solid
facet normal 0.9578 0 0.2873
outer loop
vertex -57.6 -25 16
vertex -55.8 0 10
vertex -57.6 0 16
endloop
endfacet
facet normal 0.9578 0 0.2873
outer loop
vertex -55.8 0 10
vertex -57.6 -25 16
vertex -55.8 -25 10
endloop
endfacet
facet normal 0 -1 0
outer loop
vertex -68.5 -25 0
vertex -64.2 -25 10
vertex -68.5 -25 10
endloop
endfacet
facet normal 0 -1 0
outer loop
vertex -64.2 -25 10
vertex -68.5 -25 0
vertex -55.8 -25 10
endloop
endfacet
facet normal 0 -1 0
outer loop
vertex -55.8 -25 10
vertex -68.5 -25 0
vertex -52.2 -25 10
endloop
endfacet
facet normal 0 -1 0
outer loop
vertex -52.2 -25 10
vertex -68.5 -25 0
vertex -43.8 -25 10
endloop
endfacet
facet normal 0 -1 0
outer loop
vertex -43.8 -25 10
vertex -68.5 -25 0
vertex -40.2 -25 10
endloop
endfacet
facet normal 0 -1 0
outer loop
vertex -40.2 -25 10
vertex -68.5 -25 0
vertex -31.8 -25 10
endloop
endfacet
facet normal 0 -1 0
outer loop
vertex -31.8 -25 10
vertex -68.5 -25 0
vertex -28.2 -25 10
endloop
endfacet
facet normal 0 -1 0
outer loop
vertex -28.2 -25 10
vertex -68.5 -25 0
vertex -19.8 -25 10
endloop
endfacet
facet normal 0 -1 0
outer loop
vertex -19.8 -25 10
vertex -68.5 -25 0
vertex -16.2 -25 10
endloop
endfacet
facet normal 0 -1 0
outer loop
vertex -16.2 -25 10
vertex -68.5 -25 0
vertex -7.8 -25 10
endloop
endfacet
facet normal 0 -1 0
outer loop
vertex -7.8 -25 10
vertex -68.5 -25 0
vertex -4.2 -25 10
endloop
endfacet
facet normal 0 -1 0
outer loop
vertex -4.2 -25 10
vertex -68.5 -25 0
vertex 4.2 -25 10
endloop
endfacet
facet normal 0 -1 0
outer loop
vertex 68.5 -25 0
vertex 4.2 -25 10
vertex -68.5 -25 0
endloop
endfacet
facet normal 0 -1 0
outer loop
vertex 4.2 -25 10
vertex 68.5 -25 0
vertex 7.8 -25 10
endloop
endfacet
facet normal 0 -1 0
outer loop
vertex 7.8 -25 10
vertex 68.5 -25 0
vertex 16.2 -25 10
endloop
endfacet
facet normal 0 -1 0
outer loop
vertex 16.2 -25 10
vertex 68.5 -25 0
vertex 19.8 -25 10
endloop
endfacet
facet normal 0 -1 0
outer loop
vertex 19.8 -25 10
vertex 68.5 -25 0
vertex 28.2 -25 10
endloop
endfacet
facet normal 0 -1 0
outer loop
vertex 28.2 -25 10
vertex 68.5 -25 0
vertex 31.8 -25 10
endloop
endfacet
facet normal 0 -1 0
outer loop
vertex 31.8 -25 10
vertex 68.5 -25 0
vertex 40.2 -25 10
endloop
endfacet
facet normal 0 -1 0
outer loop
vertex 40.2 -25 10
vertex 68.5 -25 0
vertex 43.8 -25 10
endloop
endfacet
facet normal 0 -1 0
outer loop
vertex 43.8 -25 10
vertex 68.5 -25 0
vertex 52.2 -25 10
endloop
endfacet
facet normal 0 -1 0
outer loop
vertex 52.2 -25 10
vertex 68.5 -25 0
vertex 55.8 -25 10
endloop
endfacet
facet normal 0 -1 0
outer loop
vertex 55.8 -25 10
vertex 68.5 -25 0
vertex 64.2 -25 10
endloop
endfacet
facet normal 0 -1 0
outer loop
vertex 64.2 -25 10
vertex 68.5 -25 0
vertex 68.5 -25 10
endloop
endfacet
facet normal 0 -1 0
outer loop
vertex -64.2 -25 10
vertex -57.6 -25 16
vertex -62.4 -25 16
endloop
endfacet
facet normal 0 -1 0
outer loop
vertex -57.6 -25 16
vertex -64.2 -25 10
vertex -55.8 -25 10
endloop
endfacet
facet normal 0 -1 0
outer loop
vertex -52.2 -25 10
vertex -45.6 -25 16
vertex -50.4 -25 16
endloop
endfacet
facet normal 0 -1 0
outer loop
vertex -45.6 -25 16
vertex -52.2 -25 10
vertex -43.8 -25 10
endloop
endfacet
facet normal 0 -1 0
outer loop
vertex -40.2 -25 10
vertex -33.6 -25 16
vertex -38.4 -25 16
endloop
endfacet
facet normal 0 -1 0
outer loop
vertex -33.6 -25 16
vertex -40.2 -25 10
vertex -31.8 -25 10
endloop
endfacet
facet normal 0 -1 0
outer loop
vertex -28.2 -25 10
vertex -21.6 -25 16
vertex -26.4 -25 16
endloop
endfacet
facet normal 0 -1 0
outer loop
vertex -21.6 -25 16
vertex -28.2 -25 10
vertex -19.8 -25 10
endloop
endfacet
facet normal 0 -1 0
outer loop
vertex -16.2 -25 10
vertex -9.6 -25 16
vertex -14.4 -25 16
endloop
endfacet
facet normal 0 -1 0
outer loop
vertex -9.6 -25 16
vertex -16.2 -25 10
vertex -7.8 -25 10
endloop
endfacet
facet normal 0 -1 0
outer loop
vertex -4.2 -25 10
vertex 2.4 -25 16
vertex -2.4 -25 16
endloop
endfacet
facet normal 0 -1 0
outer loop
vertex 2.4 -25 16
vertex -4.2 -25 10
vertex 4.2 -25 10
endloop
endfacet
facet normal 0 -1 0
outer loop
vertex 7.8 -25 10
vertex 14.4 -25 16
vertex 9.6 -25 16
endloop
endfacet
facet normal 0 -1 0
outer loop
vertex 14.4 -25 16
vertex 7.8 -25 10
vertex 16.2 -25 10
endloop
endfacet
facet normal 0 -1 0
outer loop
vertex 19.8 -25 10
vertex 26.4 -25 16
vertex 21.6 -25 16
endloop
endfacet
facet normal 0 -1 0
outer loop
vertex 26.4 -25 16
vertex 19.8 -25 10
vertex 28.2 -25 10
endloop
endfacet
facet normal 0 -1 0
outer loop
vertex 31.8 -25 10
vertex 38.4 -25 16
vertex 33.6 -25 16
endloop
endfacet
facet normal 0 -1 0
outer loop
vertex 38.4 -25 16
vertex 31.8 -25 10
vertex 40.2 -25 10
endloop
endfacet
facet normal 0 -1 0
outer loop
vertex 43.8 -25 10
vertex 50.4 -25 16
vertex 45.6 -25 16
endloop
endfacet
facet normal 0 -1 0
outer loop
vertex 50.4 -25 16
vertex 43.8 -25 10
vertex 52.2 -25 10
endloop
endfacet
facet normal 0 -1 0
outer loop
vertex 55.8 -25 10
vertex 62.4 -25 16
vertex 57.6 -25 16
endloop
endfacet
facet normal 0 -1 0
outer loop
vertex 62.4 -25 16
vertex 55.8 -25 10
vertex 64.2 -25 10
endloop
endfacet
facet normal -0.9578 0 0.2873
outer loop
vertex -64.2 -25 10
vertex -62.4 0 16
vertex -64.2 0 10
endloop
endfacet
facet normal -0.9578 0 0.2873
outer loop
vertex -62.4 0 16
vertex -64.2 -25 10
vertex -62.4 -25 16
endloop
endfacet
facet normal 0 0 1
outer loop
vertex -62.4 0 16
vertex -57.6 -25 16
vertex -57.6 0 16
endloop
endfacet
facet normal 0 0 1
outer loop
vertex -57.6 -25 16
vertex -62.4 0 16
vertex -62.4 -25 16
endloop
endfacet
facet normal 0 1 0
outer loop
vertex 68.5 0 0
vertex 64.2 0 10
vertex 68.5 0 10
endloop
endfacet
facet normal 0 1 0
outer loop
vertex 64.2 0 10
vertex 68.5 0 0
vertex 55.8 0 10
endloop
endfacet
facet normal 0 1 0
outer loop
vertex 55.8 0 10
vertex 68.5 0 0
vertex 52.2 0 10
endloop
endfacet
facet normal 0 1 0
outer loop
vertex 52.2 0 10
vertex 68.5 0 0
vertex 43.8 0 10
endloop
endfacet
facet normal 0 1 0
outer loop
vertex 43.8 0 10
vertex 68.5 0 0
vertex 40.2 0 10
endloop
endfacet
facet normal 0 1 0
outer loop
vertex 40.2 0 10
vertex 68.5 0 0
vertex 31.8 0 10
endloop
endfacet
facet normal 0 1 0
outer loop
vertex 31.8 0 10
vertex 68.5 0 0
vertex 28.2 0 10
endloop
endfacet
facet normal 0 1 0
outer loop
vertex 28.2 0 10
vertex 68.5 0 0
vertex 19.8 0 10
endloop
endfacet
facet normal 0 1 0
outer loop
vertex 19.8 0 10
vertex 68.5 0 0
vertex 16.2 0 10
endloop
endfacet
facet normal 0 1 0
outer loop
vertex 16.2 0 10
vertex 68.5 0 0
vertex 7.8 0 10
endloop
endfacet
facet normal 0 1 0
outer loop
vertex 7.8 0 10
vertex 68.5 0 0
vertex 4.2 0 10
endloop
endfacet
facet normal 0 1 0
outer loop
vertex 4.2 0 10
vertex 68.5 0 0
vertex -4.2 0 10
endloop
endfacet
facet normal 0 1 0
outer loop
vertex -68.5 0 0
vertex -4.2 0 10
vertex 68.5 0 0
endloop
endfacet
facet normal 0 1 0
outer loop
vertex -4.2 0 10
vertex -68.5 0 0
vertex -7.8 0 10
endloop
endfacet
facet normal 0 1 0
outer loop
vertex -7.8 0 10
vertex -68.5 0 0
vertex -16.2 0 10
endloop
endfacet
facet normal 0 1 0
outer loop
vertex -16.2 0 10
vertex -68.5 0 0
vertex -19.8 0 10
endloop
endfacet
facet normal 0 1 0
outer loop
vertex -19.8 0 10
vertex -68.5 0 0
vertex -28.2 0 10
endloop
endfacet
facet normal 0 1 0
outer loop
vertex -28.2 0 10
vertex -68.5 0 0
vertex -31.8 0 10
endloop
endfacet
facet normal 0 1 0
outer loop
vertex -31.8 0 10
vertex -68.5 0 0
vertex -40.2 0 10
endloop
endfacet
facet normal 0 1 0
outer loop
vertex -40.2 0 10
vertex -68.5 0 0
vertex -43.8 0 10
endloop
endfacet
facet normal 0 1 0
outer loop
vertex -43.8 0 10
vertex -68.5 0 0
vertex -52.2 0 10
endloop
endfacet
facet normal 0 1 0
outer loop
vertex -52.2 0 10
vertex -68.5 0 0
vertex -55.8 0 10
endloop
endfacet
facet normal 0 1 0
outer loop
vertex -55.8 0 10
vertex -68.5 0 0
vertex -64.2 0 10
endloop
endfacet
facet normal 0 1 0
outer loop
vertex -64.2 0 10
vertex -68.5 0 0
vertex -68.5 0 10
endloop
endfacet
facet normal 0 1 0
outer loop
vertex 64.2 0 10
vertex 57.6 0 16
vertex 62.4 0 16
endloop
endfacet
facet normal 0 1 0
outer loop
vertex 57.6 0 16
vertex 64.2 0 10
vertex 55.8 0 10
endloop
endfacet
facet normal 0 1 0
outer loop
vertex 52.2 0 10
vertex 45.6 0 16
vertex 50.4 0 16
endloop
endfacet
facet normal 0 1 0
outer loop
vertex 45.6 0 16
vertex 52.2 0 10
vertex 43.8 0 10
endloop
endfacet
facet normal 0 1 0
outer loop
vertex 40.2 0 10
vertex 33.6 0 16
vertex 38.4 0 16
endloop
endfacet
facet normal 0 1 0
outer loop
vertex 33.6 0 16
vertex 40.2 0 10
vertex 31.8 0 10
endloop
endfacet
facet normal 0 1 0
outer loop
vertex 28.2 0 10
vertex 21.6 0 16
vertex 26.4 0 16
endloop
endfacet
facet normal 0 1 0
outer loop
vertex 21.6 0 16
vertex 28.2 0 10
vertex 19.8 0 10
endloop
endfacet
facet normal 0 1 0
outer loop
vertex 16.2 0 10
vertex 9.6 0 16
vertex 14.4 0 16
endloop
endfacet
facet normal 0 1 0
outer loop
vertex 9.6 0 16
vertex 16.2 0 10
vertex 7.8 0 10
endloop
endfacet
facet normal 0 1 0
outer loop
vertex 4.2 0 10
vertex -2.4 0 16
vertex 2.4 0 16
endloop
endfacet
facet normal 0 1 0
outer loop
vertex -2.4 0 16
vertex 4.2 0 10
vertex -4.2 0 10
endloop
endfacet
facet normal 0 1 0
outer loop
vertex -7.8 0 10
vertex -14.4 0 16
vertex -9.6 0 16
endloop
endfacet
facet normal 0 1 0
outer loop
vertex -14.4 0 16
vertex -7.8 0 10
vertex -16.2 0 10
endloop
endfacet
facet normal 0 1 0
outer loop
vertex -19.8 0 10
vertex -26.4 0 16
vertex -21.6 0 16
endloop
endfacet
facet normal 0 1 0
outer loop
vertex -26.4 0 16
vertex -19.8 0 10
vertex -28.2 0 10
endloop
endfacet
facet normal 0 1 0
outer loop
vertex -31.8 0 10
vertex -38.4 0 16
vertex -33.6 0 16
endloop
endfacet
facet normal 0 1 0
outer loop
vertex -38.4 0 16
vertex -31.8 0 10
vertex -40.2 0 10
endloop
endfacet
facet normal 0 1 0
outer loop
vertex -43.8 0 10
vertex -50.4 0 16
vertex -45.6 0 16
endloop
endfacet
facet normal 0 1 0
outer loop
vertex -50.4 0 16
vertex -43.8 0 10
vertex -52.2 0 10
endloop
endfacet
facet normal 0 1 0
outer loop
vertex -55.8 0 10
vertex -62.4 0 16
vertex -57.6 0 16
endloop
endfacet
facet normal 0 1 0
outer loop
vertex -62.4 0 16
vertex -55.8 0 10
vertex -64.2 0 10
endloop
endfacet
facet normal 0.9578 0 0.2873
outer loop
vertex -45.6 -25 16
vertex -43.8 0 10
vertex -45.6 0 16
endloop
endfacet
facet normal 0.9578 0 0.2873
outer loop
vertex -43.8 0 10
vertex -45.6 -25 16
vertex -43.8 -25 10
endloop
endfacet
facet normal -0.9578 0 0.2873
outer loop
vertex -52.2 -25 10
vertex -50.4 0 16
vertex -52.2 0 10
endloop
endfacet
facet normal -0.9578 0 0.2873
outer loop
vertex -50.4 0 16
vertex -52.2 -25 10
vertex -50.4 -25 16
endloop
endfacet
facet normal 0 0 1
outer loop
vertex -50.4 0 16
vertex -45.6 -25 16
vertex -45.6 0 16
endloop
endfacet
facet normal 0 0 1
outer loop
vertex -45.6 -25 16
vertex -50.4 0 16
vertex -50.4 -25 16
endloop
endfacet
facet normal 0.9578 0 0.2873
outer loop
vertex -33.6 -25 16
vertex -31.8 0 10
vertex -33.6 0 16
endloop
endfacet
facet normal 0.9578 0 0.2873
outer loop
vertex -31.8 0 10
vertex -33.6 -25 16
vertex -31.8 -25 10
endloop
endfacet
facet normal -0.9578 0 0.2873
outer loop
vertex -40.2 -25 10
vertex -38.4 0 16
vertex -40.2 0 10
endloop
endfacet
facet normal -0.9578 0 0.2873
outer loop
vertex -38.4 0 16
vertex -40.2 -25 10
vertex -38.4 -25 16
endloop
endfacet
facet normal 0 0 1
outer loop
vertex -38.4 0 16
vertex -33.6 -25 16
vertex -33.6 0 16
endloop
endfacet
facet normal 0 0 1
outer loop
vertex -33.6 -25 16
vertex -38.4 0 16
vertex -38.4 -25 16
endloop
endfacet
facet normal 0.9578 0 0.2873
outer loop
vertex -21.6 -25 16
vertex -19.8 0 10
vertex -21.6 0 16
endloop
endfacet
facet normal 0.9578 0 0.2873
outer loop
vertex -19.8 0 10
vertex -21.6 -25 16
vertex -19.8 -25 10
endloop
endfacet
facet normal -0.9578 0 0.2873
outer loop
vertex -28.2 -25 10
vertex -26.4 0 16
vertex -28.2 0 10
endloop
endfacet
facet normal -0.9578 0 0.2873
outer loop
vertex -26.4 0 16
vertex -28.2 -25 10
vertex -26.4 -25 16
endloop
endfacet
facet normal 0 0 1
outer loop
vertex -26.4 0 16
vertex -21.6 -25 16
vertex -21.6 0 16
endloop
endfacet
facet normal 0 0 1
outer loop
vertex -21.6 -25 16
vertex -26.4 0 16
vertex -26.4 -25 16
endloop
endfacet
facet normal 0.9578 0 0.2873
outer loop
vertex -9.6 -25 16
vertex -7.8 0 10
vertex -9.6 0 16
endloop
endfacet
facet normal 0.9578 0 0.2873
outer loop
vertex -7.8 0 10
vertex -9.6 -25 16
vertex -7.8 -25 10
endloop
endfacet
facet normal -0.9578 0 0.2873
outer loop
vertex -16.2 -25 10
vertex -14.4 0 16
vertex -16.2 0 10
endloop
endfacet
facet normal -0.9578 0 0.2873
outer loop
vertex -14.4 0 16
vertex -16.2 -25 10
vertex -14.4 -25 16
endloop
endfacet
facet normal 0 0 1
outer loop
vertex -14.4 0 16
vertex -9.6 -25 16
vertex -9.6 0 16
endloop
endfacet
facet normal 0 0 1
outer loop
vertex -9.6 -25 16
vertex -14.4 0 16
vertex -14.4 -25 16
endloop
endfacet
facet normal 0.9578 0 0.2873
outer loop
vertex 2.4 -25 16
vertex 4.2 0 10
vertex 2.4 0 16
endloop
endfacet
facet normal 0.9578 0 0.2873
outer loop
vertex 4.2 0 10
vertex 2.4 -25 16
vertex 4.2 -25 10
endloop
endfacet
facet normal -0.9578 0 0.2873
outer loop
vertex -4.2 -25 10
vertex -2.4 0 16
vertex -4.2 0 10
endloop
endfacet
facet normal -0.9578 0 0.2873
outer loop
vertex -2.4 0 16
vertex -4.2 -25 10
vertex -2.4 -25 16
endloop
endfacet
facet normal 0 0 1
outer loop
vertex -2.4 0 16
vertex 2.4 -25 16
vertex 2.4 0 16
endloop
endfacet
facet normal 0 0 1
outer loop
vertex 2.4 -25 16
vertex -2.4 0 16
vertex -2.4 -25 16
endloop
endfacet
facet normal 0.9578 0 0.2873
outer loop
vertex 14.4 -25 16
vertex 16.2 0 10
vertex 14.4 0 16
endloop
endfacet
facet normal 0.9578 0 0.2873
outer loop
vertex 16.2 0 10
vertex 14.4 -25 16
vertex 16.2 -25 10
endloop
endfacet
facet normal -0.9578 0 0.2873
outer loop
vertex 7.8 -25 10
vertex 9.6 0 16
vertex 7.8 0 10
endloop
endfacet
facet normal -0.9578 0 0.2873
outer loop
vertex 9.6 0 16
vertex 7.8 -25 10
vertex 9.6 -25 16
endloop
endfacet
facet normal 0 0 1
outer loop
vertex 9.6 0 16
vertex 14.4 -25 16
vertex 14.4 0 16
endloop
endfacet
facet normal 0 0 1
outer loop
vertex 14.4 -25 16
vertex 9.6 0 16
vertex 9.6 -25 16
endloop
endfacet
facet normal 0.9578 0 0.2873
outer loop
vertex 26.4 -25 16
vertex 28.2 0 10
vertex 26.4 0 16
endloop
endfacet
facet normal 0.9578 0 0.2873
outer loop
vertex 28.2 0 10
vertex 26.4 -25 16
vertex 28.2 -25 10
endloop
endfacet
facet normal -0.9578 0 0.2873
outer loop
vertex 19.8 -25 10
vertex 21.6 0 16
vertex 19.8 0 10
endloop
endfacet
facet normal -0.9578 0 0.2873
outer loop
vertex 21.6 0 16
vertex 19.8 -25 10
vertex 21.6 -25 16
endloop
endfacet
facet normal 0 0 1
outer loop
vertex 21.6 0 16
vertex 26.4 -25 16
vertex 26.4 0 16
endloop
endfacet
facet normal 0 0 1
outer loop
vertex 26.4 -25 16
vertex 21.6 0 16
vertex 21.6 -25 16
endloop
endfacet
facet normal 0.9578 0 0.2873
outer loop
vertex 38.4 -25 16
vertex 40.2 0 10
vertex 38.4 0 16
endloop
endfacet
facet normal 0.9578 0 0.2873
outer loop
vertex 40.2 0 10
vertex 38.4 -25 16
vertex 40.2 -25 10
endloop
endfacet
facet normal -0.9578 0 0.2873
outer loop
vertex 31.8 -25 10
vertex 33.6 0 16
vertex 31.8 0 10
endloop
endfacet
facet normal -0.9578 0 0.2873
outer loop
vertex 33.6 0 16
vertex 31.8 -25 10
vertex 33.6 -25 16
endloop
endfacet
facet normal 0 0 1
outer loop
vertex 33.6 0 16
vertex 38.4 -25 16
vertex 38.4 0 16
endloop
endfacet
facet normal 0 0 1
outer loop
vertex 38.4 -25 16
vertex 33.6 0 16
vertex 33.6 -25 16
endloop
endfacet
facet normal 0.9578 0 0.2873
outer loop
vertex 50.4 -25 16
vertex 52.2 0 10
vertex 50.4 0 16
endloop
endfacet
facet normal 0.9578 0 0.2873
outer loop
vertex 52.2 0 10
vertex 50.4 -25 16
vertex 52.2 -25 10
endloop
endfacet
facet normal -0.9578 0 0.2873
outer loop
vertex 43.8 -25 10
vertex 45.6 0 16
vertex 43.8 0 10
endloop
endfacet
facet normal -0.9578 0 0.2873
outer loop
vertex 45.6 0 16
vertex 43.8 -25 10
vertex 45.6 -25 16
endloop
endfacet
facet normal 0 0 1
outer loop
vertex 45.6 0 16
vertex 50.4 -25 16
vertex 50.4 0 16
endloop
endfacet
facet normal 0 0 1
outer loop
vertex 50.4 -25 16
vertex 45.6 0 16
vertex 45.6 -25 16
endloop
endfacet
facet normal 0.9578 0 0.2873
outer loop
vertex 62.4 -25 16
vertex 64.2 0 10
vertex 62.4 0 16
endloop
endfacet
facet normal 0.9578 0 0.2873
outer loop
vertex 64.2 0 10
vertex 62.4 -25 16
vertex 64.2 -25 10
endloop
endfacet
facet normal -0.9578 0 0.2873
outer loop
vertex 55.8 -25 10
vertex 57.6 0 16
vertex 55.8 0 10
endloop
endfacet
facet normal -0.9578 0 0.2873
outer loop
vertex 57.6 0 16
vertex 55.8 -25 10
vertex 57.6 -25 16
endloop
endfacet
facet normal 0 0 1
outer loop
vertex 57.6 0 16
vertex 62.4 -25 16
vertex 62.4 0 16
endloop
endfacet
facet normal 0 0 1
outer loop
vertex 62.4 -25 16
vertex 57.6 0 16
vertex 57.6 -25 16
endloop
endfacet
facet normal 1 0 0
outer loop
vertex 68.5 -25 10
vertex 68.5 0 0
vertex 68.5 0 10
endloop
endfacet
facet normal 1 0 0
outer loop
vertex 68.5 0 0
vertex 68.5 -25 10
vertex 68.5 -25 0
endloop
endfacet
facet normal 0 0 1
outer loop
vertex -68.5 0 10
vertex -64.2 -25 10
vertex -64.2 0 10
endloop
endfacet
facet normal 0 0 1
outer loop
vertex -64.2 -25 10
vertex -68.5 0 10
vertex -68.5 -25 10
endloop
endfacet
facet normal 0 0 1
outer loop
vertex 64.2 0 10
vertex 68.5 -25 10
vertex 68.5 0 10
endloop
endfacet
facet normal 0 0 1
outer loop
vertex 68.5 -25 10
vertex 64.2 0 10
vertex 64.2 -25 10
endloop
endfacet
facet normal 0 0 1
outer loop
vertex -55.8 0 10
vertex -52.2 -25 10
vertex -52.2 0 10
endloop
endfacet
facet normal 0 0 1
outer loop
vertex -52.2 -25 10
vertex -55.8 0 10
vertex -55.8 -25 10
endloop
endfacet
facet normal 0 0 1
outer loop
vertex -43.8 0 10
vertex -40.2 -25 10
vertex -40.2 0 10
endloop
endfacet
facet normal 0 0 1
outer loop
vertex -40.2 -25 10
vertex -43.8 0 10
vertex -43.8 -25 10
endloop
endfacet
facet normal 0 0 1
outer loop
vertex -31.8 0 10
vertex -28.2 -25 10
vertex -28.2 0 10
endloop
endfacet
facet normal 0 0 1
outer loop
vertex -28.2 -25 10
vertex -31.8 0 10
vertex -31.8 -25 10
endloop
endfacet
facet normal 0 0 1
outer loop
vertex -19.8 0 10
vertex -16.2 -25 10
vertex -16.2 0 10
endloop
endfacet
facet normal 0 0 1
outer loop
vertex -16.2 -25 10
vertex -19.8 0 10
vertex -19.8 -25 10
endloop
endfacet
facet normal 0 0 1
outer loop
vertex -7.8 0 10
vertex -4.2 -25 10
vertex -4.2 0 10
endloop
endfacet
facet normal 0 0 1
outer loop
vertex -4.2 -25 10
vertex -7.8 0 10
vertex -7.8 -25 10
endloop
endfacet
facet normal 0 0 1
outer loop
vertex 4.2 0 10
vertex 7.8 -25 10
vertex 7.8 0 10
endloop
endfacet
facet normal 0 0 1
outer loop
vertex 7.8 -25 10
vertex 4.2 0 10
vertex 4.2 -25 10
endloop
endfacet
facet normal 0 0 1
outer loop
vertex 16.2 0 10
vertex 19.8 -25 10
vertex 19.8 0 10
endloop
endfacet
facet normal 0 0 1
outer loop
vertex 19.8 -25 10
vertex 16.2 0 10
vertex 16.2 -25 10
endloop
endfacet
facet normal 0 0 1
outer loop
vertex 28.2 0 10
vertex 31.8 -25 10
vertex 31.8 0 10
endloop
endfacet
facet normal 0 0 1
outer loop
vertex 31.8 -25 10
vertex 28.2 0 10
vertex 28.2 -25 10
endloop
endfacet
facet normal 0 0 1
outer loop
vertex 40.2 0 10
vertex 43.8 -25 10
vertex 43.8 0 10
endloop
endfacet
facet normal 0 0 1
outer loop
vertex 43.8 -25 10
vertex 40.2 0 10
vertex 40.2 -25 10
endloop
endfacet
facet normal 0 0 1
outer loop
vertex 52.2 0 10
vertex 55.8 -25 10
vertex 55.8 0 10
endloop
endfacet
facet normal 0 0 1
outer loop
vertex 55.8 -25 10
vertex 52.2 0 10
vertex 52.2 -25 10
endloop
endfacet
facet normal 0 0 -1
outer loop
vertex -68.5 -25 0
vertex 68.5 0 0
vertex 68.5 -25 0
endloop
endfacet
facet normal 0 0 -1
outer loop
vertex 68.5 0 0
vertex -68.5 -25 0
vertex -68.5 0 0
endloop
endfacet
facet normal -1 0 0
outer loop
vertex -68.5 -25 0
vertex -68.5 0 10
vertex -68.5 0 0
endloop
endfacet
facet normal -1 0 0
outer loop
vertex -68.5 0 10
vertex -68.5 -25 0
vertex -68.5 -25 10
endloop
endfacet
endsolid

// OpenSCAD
$fn = 32;

// ----------------------------------------------------------------------
// Toothed rack, 11 teeth
// 12 mm pitch, 6 mm teeth
// ----------------------------------------------------------------------

// --- parameters (mm) ---
bar_w = 25;     // bar width (Y)
bar_h = 10;     // bar height (Z)
teeth = 11;     // number of teeth
pitch = 12;     // tooth pitch
tooth_h = 6;    // tooth height above the bar
root_w = 9;     // tooth width at the root
crest_w = 4.8;  // tooth width at the crest

// --- derived feature positions (mm) ---
span = (teeth - 1) * pitch;  // = 120   distance between the outer teeth
bar_l = span + root_w + 8;   // = 137   bar length: teeth plus 4 mm at each end
tooth_x = -span / 2;         // = -60   X of the first tooth
height = bar_h + tooth_h;    // = 16   overall height
feature_centers = [
  [tooth_x + 0 * pitch, -bar_w / 2],
  [tooth_x + 1 * pitch, -bar_w / 2],
  [tooth_x + 2 * pitch, -bar_w / 2],
  [tooth_x + 3 * pitch, -bar_w / 2],
  [tooth_x + 4 * pitch, -bar_w / 2],
  [tooth_x + 5 * pitch, -bar_w / 2],
  [tooth_x + 6 * pitch, -bar_w / 2],
  [tooth_x + 7 * pitch, -bar_w / 2],
  [tooth_x + 8 * pitch, -bar_w / 2],
  [tooth_x + 9 * pitch, -bar_w / 2],
  [tooth_x + 10 * pitch, -bar_w / 2]
];   // tooth centre line, drives the tooth loop

// bar with a rack of teeth, one extruded trapezoium per centre
module rack_tooth() {
  linear_extrude(height = bar_w)
    polygon(points = [
      [0, 0],
      [root_w, 0],
      [root_w / 2 + crest_w / 2, tooth_h + 1],
      [root_w / 2 - crest_w / 2, tooth_h + 1]
    ]);
}

union() {
  translate([-bar_l / 2, -bar_w, 0]) cube([bar_l, bar_w, bar_h]);
  for (centre = feature_centers)
    translate([centre[0] - root_w / 2, 0, bar_h - 1]) rotate([90, 0, 0]) rack_tooth();
}
